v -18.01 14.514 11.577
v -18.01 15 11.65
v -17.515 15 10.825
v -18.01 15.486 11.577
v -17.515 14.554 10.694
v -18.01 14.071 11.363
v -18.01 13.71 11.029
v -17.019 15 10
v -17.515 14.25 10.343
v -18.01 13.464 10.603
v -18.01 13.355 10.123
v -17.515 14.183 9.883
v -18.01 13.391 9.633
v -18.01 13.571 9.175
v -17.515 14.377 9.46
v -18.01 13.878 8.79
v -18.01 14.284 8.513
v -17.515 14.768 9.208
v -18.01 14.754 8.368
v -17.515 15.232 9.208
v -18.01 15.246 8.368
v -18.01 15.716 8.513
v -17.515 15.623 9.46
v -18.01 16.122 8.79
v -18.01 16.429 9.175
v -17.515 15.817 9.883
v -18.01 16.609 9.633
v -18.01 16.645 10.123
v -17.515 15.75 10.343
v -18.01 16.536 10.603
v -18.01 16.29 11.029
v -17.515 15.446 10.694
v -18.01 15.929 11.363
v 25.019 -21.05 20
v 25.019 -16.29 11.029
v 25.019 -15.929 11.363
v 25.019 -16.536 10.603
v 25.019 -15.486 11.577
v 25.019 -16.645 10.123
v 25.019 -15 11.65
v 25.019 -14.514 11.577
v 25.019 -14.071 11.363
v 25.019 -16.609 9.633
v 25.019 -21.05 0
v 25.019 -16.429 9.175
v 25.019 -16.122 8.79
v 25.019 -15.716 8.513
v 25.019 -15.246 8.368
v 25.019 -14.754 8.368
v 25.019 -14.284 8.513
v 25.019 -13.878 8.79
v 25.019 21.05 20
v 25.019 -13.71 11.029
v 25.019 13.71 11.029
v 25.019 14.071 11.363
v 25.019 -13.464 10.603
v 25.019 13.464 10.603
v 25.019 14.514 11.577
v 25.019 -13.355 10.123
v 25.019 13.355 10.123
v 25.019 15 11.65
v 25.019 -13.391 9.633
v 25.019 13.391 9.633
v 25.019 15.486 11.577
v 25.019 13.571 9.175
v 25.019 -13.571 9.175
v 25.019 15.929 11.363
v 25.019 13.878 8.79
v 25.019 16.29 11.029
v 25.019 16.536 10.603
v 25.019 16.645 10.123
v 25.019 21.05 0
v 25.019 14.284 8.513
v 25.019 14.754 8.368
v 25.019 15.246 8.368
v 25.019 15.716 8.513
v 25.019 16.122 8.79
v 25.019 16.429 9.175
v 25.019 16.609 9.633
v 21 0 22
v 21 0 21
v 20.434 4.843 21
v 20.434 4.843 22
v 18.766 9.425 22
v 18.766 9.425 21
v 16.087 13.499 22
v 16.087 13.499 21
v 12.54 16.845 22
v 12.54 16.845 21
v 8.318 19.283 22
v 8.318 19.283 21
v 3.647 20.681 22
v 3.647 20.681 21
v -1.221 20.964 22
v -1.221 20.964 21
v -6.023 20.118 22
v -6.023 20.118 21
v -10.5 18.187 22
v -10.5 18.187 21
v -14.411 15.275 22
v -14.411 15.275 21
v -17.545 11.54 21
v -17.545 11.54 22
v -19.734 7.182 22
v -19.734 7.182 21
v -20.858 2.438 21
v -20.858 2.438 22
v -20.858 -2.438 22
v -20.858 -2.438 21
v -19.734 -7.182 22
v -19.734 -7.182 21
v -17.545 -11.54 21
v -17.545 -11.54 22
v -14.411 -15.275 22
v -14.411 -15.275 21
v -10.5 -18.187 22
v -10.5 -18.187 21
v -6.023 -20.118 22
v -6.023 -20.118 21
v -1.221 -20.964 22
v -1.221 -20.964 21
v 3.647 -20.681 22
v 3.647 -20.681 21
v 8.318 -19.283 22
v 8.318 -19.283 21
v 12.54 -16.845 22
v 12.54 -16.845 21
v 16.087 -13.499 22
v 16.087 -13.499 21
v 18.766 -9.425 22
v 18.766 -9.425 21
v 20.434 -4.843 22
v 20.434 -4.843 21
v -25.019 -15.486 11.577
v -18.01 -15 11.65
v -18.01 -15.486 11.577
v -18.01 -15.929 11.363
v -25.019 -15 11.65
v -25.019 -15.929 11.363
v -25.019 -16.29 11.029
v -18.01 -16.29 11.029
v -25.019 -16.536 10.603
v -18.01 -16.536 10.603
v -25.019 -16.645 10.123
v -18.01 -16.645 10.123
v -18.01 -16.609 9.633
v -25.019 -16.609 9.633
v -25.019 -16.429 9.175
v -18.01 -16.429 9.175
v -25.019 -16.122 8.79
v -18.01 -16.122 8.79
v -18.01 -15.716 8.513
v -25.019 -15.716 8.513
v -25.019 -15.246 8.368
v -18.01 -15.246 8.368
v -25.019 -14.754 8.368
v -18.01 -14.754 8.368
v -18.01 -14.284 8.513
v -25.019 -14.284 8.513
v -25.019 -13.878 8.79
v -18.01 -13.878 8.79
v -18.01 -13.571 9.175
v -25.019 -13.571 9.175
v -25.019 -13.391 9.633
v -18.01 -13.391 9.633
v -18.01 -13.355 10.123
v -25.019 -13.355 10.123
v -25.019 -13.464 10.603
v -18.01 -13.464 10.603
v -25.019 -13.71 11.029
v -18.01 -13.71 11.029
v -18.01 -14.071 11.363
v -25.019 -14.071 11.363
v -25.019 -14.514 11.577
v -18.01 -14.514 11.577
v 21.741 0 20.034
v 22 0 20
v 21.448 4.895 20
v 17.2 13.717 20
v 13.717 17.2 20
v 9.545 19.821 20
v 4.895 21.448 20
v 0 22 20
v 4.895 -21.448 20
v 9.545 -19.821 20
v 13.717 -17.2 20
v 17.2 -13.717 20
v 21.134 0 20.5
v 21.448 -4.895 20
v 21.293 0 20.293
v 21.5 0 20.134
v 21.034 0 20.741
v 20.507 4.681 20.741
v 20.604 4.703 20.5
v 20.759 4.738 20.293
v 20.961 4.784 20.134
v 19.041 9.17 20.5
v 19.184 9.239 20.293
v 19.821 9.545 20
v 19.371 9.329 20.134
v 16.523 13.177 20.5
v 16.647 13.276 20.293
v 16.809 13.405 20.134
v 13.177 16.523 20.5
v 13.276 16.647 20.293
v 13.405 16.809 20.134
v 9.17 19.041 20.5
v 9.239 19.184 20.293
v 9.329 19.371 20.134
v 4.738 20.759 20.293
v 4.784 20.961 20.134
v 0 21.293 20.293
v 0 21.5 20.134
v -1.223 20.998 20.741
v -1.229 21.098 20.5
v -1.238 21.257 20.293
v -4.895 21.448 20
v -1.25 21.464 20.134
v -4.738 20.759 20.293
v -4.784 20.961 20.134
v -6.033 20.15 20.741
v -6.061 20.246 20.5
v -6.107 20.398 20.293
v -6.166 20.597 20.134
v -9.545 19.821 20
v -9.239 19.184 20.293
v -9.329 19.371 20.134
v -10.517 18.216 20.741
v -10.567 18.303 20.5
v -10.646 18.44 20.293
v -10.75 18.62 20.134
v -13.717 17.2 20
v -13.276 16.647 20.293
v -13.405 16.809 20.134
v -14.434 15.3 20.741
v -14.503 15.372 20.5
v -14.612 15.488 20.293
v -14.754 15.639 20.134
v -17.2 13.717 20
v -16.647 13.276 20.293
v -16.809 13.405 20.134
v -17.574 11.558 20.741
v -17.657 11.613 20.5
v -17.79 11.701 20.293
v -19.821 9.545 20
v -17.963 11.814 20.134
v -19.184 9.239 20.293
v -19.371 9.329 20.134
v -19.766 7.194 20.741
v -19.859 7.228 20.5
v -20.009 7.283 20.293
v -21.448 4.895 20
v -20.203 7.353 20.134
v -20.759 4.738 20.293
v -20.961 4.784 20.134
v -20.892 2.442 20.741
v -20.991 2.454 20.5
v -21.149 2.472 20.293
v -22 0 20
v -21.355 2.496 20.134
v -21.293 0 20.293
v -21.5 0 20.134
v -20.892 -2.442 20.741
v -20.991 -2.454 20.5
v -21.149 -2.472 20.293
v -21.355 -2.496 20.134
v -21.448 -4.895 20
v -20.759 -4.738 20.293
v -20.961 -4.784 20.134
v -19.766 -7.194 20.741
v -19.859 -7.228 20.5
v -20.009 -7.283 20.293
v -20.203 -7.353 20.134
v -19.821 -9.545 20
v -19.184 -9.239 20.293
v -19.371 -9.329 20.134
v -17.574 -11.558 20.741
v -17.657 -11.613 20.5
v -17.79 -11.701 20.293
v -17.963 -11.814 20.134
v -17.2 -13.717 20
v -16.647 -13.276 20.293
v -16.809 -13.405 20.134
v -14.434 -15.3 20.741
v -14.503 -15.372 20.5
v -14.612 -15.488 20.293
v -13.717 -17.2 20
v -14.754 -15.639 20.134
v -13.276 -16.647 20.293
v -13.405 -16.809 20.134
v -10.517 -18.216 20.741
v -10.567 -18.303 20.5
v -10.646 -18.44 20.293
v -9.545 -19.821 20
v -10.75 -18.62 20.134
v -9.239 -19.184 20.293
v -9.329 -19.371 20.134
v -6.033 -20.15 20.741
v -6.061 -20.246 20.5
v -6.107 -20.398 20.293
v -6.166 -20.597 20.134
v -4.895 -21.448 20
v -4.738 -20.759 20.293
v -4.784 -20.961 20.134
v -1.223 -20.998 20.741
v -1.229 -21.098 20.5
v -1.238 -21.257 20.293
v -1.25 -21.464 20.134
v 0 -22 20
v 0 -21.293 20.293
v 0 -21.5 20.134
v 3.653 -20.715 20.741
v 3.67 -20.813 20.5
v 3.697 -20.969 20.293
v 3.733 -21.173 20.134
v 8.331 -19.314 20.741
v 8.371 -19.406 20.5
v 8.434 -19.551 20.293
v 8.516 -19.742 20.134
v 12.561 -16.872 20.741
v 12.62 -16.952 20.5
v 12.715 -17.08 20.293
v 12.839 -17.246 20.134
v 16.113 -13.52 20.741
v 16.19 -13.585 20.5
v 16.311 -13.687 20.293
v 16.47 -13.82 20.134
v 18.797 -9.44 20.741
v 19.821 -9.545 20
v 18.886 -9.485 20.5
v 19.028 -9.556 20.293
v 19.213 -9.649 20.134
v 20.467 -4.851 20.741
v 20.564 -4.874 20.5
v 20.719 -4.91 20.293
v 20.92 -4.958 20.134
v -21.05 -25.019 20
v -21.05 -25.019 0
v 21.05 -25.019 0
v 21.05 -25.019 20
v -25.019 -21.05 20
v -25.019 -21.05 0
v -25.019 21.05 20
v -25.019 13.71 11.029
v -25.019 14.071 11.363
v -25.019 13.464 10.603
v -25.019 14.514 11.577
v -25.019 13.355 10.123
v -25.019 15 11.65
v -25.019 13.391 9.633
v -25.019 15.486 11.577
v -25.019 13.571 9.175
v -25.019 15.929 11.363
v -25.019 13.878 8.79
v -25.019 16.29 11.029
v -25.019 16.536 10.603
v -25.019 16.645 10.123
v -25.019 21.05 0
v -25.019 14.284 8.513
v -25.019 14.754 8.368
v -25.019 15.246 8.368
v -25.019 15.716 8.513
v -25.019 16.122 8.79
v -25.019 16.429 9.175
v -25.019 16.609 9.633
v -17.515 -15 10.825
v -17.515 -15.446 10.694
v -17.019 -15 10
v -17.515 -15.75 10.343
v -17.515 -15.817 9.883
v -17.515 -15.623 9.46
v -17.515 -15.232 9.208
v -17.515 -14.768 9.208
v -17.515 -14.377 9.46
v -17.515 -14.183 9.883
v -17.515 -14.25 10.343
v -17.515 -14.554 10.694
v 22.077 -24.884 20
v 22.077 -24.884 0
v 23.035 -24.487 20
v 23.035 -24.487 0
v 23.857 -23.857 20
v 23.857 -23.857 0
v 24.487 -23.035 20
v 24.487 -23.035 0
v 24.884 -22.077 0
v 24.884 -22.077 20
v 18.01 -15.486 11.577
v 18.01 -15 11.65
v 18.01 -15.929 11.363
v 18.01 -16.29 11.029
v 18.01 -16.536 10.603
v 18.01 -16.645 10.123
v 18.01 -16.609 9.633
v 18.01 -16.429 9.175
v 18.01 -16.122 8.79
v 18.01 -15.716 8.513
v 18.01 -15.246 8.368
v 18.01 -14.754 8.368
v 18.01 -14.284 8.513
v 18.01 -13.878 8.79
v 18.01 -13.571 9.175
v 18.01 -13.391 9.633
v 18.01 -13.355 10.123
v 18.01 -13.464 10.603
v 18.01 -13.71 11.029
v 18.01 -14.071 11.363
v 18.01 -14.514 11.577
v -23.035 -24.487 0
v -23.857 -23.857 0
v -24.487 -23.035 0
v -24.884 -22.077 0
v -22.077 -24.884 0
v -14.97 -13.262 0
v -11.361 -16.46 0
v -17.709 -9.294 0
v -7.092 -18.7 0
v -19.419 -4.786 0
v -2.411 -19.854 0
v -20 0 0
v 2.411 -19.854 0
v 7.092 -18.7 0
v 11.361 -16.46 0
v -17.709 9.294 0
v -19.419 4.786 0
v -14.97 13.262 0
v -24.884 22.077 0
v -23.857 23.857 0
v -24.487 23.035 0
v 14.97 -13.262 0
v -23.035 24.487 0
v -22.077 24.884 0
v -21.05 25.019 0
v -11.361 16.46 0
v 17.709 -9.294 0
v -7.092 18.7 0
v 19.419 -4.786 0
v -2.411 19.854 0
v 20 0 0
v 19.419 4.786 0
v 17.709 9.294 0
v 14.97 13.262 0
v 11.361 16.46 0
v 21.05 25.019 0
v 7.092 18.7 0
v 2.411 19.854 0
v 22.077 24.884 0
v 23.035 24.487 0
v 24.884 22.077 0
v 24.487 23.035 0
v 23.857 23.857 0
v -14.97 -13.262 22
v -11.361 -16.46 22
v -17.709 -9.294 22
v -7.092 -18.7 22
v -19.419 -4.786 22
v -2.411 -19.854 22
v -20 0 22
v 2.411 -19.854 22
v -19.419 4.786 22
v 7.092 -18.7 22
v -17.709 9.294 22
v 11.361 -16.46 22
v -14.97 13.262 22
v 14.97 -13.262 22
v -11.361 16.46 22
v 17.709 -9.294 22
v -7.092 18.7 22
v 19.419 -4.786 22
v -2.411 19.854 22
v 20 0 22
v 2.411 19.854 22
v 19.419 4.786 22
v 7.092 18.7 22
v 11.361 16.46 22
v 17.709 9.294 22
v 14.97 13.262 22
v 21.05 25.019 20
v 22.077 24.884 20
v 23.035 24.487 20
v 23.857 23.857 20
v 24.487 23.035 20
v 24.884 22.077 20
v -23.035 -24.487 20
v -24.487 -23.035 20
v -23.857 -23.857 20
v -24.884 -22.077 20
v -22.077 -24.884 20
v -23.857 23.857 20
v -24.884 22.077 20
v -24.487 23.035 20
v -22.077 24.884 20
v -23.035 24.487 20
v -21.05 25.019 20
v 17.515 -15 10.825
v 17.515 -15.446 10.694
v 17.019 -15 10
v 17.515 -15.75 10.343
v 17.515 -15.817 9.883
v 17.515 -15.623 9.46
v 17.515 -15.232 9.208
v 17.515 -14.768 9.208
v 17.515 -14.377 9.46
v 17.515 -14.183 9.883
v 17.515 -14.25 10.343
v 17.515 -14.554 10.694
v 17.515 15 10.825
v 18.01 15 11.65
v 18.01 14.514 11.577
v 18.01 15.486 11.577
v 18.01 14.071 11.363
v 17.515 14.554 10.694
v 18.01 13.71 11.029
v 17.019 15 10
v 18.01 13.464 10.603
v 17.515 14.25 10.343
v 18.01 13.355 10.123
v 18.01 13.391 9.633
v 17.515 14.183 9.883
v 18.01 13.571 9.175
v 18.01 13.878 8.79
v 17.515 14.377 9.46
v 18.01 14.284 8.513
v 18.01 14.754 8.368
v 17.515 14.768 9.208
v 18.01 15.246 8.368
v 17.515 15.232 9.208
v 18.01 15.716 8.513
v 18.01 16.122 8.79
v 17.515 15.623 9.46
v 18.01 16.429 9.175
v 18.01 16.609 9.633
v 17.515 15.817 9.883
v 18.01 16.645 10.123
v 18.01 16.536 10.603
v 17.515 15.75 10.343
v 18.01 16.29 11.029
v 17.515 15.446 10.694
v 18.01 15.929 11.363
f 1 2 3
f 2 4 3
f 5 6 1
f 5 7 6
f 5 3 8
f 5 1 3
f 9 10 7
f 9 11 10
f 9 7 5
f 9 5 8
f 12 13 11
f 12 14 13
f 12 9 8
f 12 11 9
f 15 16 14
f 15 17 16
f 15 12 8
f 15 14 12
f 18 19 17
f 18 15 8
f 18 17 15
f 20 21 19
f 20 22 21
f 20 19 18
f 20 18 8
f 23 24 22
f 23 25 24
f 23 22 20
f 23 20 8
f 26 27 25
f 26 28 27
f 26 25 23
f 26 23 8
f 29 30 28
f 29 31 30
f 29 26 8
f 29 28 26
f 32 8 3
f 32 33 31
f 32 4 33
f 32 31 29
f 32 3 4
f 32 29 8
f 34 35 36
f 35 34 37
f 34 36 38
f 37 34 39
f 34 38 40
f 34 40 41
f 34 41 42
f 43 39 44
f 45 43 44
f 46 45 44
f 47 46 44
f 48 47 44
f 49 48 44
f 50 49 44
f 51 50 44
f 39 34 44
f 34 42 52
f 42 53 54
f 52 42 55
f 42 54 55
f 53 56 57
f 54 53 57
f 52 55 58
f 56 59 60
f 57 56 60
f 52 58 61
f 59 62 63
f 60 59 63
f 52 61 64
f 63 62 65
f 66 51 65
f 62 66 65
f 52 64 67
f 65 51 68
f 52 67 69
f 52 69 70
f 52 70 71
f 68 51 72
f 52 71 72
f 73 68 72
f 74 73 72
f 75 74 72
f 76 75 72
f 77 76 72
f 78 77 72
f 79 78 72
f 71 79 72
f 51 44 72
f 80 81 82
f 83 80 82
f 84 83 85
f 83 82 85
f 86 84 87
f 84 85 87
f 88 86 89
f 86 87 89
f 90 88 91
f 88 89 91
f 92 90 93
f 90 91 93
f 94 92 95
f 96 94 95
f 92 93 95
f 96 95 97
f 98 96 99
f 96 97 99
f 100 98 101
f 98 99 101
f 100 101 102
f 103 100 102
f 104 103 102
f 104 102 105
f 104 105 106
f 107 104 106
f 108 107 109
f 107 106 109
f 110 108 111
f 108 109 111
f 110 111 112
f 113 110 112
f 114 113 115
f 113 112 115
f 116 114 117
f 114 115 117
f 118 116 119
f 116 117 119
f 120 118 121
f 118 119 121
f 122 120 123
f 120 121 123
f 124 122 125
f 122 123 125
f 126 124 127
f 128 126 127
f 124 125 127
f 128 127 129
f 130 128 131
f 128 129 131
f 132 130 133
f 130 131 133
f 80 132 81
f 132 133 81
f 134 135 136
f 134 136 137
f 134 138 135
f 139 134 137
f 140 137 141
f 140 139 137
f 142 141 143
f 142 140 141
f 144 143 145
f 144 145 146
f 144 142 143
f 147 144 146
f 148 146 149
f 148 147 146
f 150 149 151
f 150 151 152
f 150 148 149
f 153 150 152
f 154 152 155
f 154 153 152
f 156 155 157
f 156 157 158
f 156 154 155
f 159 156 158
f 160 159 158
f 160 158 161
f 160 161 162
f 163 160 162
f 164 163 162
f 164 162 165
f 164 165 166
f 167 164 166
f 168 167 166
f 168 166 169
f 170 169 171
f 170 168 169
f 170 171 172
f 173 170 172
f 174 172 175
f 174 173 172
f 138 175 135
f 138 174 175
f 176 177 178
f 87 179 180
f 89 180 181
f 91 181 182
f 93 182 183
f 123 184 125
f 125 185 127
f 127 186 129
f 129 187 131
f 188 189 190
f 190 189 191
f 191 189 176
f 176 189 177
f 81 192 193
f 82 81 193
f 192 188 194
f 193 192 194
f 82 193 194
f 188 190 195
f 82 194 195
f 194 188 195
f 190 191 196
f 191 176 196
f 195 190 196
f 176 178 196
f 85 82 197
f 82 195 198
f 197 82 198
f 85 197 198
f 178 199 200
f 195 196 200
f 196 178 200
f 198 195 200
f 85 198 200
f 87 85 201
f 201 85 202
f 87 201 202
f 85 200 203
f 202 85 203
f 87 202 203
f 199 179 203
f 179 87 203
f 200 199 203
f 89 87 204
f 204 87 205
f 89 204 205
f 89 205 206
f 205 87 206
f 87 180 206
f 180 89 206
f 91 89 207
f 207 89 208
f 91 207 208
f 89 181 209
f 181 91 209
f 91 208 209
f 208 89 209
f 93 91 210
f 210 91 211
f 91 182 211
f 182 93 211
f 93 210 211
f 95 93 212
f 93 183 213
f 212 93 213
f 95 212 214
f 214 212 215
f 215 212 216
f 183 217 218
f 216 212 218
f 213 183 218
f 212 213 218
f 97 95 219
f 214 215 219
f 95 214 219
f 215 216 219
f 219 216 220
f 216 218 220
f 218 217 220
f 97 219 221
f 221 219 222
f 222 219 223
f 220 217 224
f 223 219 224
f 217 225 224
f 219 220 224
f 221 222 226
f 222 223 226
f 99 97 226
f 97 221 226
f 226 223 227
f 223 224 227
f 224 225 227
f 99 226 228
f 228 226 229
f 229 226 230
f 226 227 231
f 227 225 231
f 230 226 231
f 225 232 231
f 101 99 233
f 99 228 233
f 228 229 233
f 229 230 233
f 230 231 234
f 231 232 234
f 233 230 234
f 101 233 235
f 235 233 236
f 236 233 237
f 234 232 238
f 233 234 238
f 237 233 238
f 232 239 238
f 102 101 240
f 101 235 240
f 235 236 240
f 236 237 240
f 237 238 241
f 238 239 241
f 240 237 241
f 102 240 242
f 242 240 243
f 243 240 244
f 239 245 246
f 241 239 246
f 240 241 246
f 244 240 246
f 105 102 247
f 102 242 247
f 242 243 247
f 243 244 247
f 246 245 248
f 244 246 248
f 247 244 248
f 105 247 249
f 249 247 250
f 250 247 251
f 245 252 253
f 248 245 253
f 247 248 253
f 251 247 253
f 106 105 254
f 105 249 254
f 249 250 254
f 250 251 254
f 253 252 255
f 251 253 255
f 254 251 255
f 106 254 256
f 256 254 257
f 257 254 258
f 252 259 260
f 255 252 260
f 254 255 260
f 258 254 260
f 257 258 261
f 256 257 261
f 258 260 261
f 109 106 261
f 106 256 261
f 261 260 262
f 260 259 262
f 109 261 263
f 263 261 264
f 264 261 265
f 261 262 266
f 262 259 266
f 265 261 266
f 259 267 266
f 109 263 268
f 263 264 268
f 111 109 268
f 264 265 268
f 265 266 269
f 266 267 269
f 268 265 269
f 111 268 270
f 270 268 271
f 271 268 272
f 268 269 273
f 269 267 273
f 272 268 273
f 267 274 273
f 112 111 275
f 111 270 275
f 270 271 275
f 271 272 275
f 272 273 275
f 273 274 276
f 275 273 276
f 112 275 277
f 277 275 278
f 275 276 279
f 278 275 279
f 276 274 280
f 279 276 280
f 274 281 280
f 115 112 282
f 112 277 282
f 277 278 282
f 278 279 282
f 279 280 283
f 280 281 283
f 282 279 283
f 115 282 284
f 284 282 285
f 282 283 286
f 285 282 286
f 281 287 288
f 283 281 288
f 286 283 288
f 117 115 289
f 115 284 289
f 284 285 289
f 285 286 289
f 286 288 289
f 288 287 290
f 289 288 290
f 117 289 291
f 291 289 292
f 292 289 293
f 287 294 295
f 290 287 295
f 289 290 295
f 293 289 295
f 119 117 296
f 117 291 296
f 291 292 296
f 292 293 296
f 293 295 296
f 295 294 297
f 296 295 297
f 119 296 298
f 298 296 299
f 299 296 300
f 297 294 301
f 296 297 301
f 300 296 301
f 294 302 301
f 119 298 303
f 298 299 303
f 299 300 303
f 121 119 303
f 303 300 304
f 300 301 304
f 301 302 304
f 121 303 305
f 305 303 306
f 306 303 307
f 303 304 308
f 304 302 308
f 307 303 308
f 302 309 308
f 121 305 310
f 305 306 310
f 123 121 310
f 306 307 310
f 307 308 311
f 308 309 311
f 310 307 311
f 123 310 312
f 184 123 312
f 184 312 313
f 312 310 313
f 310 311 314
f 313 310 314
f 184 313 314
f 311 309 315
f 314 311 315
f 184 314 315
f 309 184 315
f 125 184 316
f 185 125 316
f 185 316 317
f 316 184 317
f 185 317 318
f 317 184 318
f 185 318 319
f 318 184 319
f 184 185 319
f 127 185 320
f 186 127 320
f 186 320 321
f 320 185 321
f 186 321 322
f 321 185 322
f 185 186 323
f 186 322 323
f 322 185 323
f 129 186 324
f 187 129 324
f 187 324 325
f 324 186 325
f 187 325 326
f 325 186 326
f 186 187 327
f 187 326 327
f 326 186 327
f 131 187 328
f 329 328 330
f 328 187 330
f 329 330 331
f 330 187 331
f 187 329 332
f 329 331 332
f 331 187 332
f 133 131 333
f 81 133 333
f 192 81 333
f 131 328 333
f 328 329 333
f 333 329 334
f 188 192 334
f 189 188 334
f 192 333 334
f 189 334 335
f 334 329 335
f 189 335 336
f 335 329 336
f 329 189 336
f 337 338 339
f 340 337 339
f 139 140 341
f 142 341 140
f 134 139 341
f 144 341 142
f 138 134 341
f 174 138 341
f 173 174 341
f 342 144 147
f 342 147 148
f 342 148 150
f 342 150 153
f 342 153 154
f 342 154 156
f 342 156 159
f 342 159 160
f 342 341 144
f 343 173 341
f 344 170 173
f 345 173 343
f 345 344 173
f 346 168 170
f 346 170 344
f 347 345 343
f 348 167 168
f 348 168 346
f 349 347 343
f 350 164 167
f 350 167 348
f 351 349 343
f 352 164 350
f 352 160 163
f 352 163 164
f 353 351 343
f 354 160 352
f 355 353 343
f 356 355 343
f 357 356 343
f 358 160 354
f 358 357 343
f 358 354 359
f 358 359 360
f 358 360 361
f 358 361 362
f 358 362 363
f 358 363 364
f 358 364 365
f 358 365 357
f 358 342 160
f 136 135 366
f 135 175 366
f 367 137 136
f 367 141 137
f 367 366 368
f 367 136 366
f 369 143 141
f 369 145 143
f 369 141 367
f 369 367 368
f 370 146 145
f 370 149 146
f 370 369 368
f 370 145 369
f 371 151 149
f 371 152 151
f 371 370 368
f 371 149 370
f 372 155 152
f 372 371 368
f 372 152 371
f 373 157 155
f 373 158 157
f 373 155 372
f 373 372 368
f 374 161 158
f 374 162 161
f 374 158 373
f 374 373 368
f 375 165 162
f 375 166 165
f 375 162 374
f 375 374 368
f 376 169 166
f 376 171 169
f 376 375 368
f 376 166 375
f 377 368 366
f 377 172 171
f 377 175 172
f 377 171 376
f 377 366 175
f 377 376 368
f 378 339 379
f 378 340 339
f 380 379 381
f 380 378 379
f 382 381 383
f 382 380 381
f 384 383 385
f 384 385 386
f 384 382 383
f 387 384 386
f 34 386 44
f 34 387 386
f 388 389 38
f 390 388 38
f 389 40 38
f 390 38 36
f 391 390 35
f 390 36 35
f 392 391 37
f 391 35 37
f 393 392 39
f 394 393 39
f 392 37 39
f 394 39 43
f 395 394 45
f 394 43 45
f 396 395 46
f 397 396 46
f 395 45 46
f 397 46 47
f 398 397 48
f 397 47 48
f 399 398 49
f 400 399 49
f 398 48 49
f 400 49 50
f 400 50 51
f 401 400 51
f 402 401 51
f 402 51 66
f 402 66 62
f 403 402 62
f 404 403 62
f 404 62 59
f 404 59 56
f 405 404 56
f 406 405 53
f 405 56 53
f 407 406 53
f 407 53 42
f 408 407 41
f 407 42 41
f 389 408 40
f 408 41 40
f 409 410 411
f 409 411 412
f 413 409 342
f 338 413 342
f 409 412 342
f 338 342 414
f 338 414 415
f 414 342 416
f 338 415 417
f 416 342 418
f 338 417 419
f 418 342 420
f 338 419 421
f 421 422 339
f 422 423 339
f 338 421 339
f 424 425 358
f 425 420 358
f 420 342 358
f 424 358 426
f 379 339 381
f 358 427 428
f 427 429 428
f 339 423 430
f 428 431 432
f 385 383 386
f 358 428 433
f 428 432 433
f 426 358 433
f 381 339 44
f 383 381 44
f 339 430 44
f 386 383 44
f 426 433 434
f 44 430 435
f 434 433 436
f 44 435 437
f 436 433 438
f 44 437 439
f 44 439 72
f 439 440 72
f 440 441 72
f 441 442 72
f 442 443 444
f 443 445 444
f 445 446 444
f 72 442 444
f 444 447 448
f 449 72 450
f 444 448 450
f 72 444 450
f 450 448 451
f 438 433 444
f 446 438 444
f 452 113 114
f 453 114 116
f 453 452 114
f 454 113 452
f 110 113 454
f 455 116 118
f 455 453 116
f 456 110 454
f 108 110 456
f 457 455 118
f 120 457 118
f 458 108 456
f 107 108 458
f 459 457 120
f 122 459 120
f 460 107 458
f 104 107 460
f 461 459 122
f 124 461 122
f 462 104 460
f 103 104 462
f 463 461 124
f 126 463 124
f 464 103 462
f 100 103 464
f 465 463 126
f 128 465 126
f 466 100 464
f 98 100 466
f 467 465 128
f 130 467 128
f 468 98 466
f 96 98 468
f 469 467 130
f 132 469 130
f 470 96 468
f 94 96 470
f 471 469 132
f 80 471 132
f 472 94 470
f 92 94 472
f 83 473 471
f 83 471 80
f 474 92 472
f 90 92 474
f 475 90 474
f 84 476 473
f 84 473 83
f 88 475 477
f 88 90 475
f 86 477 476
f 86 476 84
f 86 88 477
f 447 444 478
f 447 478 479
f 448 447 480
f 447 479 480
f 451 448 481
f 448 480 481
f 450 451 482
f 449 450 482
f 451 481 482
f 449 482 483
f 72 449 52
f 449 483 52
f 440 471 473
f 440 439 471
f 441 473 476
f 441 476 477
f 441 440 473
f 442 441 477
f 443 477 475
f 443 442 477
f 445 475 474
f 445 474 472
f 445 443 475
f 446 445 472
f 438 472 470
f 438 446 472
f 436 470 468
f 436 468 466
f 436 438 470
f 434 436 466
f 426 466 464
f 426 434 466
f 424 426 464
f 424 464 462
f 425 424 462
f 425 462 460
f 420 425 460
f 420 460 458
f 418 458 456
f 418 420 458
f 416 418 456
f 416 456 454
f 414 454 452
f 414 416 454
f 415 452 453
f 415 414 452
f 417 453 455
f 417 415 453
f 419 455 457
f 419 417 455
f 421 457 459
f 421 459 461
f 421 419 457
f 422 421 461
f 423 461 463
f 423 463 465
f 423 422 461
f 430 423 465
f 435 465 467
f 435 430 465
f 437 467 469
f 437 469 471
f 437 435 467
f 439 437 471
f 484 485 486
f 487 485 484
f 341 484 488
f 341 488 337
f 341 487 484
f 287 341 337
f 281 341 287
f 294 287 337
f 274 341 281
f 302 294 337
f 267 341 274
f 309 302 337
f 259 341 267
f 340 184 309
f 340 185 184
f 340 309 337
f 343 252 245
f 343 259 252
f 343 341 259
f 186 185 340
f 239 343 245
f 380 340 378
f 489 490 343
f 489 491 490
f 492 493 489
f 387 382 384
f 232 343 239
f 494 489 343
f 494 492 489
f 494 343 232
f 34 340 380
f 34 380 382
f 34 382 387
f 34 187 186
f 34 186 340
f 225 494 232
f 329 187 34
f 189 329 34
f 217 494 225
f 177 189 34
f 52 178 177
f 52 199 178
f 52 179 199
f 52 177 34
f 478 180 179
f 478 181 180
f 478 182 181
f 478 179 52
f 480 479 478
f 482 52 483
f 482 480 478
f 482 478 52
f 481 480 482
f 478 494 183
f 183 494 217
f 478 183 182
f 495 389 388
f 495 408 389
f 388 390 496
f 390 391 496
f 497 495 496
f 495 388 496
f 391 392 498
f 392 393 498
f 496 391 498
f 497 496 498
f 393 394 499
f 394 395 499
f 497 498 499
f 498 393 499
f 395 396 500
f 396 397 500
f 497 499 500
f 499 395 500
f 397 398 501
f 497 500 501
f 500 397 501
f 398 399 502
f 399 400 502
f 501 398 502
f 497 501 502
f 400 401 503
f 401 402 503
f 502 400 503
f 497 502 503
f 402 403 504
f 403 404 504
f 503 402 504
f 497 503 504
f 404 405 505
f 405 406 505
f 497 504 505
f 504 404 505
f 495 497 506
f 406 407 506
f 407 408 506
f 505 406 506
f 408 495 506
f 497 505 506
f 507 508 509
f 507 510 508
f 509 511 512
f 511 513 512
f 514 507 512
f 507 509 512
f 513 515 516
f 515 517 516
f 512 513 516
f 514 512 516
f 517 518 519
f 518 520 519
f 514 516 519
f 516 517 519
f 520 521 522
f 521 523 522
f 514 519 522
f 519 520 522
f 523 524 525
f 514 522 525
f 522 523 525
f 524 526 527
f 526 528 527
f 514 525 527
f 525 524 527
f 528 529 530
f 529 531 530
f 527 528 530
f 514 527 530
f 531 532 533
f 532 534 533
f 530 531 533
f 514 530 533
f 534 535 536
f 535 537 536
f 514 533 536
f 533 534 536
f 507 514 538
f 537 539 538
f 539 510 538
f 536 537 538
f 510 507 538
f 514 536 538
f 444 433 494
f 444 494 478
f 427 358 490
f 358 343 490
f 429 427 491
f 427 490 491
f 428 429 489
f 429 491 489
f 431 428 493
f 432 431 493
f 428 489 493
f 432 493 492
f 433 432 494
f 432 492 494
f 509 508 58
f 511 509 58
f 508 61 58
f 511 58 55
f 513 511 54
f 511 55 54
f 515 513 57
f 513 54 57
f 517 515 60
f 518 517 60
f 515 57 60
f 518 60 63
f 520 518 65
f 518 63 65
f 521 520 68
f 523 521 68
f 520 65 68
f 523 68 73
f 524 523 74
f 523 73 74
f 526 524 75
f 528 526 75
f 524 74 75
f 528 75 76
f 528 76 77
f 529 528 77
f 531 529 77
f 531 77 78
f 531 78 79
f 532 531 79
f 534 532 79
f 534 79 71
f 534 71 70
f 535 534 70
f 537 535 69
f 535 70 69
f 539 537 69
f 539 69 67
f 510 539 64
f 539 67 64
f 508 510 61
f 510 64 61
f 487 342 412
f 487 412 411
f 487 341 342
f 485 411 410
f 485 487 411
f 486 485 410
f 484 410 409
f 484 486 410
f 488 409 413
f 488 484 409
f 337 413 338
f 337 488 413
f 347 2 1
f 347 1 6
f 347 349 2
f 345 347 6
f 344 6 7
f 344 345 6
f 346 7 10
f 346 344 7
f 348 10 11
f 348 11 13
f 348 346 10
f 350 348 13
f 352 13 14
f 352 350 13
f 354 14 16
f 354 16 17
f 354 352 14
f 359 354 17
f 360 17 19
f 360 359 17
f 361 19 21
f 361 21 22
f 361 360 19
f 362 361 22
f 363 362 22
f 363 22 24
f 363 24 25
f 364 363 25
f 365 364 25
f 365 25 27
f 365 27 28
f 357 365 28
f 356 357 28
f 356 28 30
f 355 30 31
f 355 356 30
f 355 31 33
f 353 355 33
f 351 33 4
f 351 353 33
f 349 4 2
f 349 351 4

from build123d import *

# Parameters (mm, degrees)
SKETCH1_W                      = 50.038
SKETCH1_H                      = 50.038
SKETCH1_R                      = 20
BOSS_EXTRUDE1_DEPTH            = 20
FILLET1_R                      = 3.96875
M4X0_7_TAPPED_HOLE2_AT_2_COUNT = 2
M4X0_7_TAPPED_HOLE2_AT_2_PITCH = 30
SKETCH6_R                      = 21
SKETCH6_R_2                    = 20
BOSS_EXTRUDE2_DEPTH            = 2
FILLET2_R                      = 1


with BuildPart() as part:
    # Sketch1 → Boss-Extrude1 (new body)
    with BuildSketch(Plane.XY):
        Rectangle(SKETCH1_W, SKETCH1_H)
        Circle(SKETCH1_R, mode=Mode.SUBTRACT)
    extrude(amount=BOSS_EXTRUDE1_DEPTH)

    # Fillet1
    fillet1_edges = [part.edges().sort_by_distance(p)[0] for p in [
        (25.019, -25.019, 10),
        (-25.019, -25.019, 10),
        (-25.019, 25.019, 10),
        (25.019, 25.019, 10),
    ]]
    fillet(fillet1_edges, radius=FILLET1_R)

    # Sketch5 → M4x0.7 Tapped Hole2 (revolve, cut)
    with BuildSketch(Plane(origin=(-25.019, 15, 10), x_dir=(0, 0, 1), z_dir=(0, 1, 0))):
        Polygon((0, 0), (0, 8), (1.65, 7.008579979), (1.65, 0), align=None)
    m4x0_7_tapped_hole2 = revolve(axis=Axis((-31.369, 15, 10), (1, 0, 0)), mode=Mode.SUBTRACT)

    # M4x0.7 Tapped Hole2 at 2: M4x0.7 Tapped Hole2 ×2
    with Locations(*[(0, -i * M4X0_7_TAPPED_HOLE2_AT_2_PITCH, 0) for i in range(1, M4X0_7_TAPPED_HOLE2_AT_2_COUNT)]):
        add(m4x0_7_tapped_hole2, mode=Mode.SUBTRACT)

    # Mirror1: M4x0.7 Tapped Hole2 across plane
    add(m4x0_7_tapped_hole2.mirror(Plane(origin=(0, 0, 0), x_dir=(0, 0, 1), z_dir=(1, 0, 0))), mode=Mode.SUBTRACT)

    # Mirror1 copy 1 sketch → Mirror1 copy 1 (revolve, cut)
    with BuildSketch(Plane(origin=(25.019, -15, 10), x_dir=(0, 0, 1), z_dir=(0, 1, 0))):
        Polygon((0, 0), (0, -8), (1.65, -7.008579979), (1.65, 0), align=None)
    revolve(axis=Axis((31.369, -15, 10), (1, 0, 0)), mode=Mode.SUBTRACT)

    # Sketch6 → Boss-Extrude2 (add)
    with BuildSketch(Plane.XY.offset(20)):
        Circle(SKETCH6_R)
        Circle(SKETCH6_R_2, mode=Mode.SUBTRACT)
    extrude(amount=BOSS_EXTRUDE2_DEPTH)

    # Fillet2
    fillet2_edges = [part.edges().sort_by_distance(p)[0] for p in [
        (-21, 0, 20),
    ]]
    fillet(fillet2_edges, radius=FILLET2_R)


solid = part.part
